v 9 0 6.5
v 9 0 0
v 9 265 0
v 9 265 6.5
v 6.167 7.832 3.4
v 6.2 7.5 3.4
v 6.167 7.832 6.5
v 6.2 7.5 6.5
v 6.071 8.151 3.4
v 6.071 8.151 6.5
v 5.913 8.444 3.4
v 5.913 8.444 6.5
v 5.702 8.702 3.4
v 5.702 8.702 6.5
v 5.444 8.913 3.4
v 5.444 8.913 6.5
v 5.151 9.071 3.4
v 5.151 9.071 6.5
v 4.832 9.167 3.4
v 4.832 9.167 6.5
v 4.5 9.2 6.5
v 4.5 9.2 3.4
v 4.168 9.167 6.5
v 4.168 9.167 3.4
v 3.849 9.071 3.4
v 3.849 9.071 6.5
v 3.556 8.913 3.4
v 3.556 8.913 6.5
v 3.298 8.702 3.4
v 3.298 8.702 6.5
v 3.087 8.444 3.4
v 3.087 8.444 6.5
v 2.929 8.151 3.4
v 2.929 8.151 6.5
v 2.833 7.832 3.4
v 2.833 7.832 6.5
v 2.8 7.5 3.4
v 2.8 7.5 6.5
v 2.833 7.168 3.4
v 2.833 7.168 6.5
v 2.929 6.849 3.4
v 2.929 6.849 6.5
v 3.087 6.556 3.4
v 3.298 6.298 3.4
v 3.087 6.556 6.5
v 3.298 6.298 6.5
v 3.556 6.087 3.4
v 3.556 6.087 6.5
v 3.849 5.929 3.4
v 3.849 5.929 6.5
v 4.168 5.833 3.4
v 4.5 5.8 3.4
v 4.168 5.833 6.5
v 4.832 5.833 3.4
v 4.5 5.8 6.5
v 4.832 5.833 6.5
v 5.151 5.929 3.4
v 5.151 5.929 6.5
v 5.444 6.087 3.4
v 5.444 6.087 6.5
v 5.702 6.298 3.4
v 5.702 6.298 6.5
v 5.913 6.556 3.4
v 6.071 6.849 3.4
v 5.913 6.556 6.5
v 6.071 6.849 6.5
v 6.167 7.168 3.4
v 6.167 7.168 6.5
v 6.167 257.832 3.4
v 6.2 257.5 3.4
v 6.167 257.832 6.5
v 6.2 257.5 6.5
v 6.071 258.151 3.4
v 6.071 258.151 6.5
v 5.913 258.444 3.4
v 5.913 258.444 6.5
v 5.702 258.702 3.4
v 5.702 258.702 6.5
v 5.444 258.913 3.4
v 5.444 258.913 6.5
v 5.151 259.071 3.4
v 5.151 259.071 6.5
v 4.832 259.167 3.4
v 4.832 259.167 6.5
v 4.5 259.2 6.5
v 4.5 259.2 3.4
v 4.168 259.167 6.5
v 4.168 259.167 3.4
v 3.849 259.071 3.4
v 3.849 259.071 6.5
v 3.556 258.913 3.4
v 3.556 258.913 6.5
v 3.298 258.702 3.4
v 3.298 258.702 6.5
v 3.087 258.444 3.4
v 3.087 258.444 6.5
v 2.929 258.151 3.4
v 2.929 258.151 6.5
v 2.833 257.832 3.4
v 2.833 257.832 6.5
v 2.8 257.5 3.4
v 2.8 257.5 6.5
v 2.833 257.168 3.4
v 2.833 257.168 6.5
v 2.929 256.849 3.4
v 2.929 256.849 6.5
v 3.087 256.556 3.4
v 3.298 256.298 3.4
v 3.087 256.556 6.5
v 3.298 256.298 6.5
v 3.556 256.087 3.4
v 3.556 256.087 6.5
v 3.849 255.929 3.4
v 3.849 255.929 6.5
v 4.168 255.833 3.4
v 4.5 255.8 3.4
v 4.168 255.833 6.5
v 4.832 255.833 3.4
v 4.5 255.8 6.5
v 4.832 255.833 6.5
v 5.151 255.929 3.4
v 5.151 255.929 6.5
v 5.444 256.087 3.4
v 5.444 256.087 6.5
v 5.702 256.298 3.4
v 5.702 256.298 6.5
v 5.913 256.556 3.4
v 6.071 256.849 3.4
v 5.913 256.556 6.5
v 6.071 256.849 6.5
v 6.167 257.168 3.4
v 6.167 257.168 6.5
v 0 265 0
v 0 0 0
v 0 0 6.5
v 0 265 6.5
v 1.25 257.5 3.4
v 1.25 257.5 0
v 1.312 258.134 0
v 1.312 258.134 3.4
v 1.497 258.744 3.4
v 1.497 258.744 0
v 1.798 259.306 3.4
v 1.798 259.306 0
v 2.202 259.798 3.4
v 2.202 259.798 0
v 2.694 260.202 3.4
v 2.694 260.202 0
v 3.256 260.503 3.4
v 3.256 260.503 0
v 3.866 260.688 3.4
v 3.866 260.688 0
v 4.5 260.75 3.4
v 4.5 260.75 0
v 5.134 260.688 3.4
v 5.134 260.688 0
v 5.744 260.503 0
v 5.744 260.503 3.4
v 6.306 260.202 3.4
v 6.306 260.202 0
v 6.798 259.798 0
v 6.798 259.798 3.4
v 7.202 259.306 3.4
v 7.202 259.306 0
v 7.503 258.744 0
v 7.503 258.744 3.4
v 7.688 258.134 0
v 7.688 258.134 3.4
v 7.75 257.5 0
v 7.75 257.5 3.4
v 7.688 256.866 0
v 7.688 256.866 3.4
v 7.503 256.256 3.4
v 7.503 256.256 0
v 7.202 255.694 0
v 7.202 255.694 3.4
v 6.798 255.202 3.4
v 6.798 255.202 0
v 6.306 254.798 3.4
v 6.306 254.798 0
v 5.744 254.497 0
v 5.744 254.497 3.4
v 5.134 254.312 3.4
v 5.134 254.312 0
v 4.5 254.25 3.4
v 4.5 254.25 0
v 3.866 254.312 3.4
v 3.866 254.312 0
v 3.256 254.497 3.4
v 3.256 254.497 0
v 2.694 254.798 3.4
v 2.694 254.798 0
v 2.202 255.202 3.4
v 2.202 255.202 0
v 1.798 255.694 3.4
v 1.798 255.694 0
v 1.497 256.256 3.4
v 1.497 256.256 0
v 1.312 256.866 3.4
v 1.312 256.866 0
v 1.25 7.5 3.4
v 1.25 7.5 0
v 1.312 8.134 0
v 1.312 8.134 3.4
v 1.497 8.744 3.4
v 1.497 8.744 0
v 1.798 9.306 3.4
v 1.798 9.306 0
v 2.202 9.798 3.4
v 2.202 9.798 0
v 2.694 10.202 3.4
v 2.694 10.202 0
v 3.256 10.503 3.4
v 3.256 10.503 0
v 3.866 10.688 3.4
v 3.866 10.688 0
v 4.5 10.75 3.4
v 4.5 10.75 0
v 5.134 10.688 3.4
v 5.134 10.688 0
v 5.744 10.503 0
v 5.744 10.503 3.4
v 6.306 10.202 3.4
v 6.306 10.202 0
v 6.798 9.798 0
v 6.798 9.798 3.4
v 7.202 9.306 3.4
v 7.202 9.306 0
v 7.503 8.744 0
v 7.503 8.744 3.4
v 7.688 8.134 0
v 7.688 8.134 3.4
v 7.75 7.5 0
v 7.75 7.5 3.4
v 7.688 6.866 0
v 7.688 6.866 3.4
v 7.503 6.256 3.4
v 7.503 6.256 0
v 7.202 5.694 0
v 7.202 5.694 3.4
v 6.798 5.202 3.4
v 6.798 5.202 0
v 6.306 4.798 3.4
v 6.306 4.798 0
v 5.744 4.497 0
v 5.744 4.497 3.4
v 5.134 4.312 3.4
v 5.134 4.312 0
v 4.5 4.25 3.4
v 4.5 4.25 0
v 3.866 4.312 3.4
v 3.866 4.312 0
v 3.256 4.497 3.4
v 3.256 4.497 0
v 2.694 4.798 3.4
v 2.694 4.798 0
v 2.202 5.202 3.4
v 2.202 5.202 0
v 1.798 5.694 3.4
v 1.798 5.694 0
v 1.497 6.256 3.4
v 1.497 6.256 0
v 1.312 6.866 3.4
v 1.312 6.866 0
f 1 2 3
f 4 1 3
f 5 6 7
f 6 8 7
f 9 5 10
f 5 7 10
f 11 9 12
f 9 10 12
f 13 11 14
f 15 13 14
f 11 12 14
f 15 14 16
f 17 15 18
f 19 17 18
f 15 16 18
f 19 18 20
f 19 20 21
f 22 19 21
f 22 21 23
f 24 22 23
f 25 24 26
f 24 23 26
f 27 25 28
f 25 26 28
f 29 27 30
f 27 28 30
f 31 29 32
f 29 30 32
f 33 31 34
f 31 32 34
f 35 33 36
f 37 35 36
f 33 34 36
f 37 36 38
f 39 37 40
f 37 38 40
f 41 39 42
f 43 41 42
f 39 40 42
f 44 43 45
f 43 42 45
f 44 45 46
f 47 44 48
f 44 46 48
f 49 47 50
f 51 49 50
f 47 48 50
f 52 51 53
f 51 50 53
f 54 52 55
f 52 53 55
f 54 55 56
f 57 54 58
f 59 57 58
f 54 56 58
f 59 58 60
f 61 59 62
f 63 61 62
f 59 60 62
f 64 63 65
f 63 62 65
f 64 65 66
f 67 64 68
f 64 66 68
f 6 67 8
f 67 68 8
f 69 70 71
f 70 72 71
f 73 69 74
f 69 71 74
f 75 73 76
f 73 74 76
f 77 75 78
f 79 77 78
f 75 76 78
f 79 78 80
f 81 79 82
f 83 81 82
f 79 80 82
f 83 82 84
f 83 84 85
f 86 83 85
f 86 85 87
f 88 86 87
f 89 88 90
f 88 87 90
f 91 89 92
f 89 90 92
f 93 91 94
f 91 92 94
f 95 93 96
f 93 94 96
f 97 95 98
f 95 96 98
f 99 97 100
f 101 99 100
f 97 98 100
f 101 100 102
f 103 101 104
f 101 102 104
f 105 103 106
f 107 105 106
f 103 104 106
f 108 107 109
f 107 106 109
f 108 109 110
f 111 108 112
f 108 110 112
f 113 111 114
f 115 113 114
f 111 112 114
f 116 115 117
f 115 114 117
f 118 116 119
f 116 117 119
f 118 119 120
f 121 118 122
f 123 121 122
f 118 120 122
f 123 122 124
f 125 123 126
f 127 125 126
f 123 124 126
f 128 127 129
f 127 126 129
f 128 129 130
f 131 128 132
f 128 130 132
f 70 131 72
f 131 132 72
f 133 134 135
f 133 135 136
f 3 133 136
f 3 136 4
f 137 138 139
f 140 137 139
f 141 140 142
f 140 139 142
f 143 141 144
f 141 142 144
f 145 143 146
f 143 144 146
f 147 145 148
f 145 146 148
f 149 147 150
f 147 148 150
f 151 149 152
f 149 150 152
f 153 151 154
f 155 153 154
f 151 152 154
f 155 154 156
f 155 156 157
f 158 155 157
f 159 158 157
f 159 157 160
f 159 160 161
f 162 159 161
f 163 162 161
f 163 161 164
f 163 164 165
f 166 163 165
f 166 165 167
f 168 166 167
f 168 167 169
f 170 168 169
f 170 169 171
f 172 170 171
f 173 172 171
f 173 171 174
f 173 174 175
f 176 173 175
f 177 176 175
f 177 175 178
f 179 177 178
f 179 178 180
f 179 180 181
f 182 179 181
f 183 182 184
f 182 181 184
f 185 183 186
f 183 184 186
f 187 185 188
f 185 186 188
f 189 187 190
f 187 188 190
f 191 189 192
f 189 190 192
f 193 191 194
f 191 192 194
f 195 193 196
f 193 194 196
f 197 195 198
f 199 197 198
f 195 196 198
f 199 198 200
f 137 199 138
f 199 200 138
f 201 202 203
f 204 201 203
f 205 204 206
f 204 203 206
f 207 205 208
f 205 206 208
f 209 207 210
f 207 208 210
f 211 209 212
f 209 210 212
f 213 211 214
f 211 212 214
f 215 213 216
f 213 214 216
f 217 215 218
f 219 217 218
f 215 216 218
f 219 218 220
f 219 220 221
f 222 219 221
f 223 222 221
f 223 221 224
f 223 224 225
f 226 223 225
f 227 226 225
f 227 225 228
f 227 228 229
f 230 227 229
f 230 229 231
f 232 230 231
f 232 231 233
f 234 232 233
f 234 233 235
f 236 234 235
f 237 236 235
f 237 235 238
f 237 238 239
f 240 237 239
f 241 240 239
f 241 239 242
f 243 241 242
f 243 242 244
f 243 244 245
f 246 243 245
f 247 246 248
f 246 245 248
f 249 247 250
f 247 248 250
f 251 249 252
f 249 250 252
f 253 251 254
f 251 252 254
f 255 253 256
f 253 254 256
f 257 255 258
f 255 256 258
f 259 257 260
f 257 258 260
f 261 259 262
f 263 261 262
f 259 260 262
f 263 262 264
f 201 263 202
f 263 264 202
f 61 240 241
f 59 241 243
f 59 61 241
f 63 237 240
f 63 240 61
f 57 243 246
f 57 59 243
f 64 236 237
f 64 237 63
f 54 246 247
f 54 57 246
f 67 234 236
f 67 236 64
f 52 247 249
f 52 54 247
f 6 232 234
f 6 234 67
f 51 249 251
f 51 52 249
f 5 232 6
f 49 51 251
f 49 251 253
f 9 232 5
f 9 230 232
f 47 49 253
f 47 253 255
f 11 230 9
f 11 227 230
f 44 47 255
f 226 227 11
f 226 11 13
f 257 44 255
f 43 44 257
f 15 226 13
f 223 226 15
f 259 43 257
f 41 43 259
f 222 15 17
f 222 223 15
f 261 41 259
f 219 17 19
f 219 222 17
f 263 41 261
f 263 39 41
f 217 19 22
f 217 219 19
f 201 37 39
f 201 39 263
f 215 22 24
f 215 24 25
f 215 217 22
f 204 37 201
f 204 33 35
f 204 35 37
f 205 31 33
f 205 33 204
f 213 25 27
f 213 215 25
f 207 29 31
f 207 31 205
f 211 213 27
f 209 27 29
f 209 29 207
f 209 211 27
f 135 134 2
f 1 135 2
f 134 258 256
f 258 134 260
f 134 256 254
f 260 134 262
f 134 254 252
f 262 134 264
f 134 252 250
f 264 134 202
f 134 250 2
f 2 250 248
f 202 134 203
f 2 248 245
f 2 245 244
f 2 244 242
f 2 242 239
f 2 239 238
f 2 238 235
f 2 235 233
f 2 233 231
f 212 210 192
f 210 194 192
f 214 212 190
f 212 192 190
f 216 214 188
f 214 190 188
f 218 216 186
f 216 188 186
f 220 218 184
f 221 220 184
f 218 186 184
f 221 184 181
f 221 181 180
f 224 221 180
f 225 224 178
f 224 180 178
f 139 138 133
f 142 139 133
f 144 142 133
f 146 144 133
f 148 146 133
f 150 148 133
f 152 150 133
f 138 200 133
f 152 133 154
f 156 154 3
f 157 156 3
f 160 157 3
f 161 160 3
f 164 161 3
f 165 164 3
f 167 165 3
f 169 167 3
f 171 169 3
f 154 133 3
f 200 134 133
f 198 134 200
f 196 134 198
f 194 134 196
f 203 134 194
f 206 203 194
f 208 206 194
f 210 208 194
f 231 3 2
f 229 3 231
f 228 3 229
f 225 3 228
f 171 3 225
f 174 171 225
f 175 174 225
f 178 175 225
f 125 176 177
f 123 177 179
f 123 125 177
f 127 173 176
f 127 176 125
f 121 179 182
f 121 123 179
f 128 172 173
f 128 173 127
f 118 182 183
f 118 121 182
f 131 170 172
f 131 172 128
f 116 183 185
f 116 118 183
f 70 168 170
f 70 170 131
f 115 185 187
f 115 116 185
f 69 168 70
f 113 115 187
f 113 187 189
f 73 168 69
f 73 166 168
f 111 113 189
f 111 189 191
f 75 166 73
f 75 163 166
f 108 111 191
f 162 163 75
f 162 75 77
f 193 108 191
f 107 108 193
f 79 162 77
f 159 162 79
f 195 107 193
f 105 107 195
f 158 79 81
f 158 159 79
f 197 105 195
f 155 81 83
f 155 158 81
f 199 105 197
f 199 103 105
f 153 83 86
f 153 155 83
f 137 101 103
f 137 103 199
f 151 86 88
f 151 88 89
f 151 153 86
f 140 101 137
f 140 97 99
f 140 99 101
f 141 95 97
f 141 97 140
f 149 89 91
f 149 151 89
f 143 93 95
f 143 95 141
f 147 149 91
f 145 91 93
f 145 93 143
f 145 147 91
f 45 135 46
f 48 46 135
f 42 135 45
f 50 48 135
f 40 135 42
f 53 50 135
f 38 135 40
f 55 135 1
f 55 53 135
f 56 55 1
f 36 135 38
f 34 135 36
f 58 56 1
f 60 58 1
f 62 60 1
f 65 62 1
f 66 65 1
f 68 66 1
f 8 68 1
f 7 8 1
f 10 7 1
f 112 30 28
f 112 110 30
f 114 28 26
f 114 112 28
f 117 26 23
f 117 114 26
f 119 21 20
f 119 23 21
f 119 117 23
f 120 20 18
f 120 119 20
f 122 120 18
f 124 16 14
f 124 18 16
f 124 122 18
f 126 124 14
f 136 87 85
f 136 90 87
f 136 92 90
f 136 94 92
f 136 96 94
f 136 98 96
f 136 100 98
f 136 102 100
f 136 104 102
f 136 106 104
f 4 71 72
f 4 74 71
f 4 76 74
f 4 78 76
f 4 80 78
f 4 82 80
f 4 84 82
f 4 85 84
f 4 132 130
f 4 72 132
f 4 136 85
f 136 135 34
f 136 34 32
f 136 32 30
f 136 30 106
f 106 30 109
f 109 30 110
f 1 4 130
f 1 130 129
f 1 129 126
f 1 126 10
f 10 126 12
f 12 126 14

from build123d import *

# Parameters (mm, degrees)
SKETCH_1_W                   = 9
SKETCH_1_H                   = 265
EXTRUDE_1_DEPTH              = 6.5
HOLE_WIZARD_M3_1_D           = 3.4
HOLE_WIZARD_M3_1_DEPTH       = 10.1
HOLE_WIZARD_M3_1_CBORE_D     = 6.5
HOLE_WIZARD_M3_1_CBORE_DEPTH = 3.4
HOLE_WIZARD_M3_1_TIP         = 1.021463052


with BuildPart() as part:
    # 草图1 → 凸台-拉伸1 (new body)
    with BuildSketch(Plane.XY):
        with Locations((4.5, 132.5)):
            Rectangle(SKETCH_1_W, SKETCH_1_H)
    extrude(amount=EXTRUDE_1_DEPTH)

    # M3 六角凹头螺钉的柱形沉头孔1
    with Locations(Plane(origin=(0, 0, 0), x_dir=(-1, 0, 0), z_dir=(0, 0, -1))):
        with Locations((-4.5, 7.5), (-4.5, 257.5)):
            CounterBoreHole(HOLE_WIZARD_M3_1_D / 2, HOLE_WIZARD_M3_1_CBORE_D / 2, HOLE_WIZARD_M3_1_CBORE_DEPTH, depth=HOLE_WIZARD_M3_1_DEPTH)
            with Locations((0, 0, -(HOLE_WIZARD_M3_1_DEPTH + HOLE_WIZARD_M3_1_TIP / 2))):  # 118° drill point
                Cone(0, HOLE_WIZARD_M3_1_D / 2, HOLE_WIZARD_M3_1_TIP, mode=Mode.SUBTRACT)


solid = part.part
